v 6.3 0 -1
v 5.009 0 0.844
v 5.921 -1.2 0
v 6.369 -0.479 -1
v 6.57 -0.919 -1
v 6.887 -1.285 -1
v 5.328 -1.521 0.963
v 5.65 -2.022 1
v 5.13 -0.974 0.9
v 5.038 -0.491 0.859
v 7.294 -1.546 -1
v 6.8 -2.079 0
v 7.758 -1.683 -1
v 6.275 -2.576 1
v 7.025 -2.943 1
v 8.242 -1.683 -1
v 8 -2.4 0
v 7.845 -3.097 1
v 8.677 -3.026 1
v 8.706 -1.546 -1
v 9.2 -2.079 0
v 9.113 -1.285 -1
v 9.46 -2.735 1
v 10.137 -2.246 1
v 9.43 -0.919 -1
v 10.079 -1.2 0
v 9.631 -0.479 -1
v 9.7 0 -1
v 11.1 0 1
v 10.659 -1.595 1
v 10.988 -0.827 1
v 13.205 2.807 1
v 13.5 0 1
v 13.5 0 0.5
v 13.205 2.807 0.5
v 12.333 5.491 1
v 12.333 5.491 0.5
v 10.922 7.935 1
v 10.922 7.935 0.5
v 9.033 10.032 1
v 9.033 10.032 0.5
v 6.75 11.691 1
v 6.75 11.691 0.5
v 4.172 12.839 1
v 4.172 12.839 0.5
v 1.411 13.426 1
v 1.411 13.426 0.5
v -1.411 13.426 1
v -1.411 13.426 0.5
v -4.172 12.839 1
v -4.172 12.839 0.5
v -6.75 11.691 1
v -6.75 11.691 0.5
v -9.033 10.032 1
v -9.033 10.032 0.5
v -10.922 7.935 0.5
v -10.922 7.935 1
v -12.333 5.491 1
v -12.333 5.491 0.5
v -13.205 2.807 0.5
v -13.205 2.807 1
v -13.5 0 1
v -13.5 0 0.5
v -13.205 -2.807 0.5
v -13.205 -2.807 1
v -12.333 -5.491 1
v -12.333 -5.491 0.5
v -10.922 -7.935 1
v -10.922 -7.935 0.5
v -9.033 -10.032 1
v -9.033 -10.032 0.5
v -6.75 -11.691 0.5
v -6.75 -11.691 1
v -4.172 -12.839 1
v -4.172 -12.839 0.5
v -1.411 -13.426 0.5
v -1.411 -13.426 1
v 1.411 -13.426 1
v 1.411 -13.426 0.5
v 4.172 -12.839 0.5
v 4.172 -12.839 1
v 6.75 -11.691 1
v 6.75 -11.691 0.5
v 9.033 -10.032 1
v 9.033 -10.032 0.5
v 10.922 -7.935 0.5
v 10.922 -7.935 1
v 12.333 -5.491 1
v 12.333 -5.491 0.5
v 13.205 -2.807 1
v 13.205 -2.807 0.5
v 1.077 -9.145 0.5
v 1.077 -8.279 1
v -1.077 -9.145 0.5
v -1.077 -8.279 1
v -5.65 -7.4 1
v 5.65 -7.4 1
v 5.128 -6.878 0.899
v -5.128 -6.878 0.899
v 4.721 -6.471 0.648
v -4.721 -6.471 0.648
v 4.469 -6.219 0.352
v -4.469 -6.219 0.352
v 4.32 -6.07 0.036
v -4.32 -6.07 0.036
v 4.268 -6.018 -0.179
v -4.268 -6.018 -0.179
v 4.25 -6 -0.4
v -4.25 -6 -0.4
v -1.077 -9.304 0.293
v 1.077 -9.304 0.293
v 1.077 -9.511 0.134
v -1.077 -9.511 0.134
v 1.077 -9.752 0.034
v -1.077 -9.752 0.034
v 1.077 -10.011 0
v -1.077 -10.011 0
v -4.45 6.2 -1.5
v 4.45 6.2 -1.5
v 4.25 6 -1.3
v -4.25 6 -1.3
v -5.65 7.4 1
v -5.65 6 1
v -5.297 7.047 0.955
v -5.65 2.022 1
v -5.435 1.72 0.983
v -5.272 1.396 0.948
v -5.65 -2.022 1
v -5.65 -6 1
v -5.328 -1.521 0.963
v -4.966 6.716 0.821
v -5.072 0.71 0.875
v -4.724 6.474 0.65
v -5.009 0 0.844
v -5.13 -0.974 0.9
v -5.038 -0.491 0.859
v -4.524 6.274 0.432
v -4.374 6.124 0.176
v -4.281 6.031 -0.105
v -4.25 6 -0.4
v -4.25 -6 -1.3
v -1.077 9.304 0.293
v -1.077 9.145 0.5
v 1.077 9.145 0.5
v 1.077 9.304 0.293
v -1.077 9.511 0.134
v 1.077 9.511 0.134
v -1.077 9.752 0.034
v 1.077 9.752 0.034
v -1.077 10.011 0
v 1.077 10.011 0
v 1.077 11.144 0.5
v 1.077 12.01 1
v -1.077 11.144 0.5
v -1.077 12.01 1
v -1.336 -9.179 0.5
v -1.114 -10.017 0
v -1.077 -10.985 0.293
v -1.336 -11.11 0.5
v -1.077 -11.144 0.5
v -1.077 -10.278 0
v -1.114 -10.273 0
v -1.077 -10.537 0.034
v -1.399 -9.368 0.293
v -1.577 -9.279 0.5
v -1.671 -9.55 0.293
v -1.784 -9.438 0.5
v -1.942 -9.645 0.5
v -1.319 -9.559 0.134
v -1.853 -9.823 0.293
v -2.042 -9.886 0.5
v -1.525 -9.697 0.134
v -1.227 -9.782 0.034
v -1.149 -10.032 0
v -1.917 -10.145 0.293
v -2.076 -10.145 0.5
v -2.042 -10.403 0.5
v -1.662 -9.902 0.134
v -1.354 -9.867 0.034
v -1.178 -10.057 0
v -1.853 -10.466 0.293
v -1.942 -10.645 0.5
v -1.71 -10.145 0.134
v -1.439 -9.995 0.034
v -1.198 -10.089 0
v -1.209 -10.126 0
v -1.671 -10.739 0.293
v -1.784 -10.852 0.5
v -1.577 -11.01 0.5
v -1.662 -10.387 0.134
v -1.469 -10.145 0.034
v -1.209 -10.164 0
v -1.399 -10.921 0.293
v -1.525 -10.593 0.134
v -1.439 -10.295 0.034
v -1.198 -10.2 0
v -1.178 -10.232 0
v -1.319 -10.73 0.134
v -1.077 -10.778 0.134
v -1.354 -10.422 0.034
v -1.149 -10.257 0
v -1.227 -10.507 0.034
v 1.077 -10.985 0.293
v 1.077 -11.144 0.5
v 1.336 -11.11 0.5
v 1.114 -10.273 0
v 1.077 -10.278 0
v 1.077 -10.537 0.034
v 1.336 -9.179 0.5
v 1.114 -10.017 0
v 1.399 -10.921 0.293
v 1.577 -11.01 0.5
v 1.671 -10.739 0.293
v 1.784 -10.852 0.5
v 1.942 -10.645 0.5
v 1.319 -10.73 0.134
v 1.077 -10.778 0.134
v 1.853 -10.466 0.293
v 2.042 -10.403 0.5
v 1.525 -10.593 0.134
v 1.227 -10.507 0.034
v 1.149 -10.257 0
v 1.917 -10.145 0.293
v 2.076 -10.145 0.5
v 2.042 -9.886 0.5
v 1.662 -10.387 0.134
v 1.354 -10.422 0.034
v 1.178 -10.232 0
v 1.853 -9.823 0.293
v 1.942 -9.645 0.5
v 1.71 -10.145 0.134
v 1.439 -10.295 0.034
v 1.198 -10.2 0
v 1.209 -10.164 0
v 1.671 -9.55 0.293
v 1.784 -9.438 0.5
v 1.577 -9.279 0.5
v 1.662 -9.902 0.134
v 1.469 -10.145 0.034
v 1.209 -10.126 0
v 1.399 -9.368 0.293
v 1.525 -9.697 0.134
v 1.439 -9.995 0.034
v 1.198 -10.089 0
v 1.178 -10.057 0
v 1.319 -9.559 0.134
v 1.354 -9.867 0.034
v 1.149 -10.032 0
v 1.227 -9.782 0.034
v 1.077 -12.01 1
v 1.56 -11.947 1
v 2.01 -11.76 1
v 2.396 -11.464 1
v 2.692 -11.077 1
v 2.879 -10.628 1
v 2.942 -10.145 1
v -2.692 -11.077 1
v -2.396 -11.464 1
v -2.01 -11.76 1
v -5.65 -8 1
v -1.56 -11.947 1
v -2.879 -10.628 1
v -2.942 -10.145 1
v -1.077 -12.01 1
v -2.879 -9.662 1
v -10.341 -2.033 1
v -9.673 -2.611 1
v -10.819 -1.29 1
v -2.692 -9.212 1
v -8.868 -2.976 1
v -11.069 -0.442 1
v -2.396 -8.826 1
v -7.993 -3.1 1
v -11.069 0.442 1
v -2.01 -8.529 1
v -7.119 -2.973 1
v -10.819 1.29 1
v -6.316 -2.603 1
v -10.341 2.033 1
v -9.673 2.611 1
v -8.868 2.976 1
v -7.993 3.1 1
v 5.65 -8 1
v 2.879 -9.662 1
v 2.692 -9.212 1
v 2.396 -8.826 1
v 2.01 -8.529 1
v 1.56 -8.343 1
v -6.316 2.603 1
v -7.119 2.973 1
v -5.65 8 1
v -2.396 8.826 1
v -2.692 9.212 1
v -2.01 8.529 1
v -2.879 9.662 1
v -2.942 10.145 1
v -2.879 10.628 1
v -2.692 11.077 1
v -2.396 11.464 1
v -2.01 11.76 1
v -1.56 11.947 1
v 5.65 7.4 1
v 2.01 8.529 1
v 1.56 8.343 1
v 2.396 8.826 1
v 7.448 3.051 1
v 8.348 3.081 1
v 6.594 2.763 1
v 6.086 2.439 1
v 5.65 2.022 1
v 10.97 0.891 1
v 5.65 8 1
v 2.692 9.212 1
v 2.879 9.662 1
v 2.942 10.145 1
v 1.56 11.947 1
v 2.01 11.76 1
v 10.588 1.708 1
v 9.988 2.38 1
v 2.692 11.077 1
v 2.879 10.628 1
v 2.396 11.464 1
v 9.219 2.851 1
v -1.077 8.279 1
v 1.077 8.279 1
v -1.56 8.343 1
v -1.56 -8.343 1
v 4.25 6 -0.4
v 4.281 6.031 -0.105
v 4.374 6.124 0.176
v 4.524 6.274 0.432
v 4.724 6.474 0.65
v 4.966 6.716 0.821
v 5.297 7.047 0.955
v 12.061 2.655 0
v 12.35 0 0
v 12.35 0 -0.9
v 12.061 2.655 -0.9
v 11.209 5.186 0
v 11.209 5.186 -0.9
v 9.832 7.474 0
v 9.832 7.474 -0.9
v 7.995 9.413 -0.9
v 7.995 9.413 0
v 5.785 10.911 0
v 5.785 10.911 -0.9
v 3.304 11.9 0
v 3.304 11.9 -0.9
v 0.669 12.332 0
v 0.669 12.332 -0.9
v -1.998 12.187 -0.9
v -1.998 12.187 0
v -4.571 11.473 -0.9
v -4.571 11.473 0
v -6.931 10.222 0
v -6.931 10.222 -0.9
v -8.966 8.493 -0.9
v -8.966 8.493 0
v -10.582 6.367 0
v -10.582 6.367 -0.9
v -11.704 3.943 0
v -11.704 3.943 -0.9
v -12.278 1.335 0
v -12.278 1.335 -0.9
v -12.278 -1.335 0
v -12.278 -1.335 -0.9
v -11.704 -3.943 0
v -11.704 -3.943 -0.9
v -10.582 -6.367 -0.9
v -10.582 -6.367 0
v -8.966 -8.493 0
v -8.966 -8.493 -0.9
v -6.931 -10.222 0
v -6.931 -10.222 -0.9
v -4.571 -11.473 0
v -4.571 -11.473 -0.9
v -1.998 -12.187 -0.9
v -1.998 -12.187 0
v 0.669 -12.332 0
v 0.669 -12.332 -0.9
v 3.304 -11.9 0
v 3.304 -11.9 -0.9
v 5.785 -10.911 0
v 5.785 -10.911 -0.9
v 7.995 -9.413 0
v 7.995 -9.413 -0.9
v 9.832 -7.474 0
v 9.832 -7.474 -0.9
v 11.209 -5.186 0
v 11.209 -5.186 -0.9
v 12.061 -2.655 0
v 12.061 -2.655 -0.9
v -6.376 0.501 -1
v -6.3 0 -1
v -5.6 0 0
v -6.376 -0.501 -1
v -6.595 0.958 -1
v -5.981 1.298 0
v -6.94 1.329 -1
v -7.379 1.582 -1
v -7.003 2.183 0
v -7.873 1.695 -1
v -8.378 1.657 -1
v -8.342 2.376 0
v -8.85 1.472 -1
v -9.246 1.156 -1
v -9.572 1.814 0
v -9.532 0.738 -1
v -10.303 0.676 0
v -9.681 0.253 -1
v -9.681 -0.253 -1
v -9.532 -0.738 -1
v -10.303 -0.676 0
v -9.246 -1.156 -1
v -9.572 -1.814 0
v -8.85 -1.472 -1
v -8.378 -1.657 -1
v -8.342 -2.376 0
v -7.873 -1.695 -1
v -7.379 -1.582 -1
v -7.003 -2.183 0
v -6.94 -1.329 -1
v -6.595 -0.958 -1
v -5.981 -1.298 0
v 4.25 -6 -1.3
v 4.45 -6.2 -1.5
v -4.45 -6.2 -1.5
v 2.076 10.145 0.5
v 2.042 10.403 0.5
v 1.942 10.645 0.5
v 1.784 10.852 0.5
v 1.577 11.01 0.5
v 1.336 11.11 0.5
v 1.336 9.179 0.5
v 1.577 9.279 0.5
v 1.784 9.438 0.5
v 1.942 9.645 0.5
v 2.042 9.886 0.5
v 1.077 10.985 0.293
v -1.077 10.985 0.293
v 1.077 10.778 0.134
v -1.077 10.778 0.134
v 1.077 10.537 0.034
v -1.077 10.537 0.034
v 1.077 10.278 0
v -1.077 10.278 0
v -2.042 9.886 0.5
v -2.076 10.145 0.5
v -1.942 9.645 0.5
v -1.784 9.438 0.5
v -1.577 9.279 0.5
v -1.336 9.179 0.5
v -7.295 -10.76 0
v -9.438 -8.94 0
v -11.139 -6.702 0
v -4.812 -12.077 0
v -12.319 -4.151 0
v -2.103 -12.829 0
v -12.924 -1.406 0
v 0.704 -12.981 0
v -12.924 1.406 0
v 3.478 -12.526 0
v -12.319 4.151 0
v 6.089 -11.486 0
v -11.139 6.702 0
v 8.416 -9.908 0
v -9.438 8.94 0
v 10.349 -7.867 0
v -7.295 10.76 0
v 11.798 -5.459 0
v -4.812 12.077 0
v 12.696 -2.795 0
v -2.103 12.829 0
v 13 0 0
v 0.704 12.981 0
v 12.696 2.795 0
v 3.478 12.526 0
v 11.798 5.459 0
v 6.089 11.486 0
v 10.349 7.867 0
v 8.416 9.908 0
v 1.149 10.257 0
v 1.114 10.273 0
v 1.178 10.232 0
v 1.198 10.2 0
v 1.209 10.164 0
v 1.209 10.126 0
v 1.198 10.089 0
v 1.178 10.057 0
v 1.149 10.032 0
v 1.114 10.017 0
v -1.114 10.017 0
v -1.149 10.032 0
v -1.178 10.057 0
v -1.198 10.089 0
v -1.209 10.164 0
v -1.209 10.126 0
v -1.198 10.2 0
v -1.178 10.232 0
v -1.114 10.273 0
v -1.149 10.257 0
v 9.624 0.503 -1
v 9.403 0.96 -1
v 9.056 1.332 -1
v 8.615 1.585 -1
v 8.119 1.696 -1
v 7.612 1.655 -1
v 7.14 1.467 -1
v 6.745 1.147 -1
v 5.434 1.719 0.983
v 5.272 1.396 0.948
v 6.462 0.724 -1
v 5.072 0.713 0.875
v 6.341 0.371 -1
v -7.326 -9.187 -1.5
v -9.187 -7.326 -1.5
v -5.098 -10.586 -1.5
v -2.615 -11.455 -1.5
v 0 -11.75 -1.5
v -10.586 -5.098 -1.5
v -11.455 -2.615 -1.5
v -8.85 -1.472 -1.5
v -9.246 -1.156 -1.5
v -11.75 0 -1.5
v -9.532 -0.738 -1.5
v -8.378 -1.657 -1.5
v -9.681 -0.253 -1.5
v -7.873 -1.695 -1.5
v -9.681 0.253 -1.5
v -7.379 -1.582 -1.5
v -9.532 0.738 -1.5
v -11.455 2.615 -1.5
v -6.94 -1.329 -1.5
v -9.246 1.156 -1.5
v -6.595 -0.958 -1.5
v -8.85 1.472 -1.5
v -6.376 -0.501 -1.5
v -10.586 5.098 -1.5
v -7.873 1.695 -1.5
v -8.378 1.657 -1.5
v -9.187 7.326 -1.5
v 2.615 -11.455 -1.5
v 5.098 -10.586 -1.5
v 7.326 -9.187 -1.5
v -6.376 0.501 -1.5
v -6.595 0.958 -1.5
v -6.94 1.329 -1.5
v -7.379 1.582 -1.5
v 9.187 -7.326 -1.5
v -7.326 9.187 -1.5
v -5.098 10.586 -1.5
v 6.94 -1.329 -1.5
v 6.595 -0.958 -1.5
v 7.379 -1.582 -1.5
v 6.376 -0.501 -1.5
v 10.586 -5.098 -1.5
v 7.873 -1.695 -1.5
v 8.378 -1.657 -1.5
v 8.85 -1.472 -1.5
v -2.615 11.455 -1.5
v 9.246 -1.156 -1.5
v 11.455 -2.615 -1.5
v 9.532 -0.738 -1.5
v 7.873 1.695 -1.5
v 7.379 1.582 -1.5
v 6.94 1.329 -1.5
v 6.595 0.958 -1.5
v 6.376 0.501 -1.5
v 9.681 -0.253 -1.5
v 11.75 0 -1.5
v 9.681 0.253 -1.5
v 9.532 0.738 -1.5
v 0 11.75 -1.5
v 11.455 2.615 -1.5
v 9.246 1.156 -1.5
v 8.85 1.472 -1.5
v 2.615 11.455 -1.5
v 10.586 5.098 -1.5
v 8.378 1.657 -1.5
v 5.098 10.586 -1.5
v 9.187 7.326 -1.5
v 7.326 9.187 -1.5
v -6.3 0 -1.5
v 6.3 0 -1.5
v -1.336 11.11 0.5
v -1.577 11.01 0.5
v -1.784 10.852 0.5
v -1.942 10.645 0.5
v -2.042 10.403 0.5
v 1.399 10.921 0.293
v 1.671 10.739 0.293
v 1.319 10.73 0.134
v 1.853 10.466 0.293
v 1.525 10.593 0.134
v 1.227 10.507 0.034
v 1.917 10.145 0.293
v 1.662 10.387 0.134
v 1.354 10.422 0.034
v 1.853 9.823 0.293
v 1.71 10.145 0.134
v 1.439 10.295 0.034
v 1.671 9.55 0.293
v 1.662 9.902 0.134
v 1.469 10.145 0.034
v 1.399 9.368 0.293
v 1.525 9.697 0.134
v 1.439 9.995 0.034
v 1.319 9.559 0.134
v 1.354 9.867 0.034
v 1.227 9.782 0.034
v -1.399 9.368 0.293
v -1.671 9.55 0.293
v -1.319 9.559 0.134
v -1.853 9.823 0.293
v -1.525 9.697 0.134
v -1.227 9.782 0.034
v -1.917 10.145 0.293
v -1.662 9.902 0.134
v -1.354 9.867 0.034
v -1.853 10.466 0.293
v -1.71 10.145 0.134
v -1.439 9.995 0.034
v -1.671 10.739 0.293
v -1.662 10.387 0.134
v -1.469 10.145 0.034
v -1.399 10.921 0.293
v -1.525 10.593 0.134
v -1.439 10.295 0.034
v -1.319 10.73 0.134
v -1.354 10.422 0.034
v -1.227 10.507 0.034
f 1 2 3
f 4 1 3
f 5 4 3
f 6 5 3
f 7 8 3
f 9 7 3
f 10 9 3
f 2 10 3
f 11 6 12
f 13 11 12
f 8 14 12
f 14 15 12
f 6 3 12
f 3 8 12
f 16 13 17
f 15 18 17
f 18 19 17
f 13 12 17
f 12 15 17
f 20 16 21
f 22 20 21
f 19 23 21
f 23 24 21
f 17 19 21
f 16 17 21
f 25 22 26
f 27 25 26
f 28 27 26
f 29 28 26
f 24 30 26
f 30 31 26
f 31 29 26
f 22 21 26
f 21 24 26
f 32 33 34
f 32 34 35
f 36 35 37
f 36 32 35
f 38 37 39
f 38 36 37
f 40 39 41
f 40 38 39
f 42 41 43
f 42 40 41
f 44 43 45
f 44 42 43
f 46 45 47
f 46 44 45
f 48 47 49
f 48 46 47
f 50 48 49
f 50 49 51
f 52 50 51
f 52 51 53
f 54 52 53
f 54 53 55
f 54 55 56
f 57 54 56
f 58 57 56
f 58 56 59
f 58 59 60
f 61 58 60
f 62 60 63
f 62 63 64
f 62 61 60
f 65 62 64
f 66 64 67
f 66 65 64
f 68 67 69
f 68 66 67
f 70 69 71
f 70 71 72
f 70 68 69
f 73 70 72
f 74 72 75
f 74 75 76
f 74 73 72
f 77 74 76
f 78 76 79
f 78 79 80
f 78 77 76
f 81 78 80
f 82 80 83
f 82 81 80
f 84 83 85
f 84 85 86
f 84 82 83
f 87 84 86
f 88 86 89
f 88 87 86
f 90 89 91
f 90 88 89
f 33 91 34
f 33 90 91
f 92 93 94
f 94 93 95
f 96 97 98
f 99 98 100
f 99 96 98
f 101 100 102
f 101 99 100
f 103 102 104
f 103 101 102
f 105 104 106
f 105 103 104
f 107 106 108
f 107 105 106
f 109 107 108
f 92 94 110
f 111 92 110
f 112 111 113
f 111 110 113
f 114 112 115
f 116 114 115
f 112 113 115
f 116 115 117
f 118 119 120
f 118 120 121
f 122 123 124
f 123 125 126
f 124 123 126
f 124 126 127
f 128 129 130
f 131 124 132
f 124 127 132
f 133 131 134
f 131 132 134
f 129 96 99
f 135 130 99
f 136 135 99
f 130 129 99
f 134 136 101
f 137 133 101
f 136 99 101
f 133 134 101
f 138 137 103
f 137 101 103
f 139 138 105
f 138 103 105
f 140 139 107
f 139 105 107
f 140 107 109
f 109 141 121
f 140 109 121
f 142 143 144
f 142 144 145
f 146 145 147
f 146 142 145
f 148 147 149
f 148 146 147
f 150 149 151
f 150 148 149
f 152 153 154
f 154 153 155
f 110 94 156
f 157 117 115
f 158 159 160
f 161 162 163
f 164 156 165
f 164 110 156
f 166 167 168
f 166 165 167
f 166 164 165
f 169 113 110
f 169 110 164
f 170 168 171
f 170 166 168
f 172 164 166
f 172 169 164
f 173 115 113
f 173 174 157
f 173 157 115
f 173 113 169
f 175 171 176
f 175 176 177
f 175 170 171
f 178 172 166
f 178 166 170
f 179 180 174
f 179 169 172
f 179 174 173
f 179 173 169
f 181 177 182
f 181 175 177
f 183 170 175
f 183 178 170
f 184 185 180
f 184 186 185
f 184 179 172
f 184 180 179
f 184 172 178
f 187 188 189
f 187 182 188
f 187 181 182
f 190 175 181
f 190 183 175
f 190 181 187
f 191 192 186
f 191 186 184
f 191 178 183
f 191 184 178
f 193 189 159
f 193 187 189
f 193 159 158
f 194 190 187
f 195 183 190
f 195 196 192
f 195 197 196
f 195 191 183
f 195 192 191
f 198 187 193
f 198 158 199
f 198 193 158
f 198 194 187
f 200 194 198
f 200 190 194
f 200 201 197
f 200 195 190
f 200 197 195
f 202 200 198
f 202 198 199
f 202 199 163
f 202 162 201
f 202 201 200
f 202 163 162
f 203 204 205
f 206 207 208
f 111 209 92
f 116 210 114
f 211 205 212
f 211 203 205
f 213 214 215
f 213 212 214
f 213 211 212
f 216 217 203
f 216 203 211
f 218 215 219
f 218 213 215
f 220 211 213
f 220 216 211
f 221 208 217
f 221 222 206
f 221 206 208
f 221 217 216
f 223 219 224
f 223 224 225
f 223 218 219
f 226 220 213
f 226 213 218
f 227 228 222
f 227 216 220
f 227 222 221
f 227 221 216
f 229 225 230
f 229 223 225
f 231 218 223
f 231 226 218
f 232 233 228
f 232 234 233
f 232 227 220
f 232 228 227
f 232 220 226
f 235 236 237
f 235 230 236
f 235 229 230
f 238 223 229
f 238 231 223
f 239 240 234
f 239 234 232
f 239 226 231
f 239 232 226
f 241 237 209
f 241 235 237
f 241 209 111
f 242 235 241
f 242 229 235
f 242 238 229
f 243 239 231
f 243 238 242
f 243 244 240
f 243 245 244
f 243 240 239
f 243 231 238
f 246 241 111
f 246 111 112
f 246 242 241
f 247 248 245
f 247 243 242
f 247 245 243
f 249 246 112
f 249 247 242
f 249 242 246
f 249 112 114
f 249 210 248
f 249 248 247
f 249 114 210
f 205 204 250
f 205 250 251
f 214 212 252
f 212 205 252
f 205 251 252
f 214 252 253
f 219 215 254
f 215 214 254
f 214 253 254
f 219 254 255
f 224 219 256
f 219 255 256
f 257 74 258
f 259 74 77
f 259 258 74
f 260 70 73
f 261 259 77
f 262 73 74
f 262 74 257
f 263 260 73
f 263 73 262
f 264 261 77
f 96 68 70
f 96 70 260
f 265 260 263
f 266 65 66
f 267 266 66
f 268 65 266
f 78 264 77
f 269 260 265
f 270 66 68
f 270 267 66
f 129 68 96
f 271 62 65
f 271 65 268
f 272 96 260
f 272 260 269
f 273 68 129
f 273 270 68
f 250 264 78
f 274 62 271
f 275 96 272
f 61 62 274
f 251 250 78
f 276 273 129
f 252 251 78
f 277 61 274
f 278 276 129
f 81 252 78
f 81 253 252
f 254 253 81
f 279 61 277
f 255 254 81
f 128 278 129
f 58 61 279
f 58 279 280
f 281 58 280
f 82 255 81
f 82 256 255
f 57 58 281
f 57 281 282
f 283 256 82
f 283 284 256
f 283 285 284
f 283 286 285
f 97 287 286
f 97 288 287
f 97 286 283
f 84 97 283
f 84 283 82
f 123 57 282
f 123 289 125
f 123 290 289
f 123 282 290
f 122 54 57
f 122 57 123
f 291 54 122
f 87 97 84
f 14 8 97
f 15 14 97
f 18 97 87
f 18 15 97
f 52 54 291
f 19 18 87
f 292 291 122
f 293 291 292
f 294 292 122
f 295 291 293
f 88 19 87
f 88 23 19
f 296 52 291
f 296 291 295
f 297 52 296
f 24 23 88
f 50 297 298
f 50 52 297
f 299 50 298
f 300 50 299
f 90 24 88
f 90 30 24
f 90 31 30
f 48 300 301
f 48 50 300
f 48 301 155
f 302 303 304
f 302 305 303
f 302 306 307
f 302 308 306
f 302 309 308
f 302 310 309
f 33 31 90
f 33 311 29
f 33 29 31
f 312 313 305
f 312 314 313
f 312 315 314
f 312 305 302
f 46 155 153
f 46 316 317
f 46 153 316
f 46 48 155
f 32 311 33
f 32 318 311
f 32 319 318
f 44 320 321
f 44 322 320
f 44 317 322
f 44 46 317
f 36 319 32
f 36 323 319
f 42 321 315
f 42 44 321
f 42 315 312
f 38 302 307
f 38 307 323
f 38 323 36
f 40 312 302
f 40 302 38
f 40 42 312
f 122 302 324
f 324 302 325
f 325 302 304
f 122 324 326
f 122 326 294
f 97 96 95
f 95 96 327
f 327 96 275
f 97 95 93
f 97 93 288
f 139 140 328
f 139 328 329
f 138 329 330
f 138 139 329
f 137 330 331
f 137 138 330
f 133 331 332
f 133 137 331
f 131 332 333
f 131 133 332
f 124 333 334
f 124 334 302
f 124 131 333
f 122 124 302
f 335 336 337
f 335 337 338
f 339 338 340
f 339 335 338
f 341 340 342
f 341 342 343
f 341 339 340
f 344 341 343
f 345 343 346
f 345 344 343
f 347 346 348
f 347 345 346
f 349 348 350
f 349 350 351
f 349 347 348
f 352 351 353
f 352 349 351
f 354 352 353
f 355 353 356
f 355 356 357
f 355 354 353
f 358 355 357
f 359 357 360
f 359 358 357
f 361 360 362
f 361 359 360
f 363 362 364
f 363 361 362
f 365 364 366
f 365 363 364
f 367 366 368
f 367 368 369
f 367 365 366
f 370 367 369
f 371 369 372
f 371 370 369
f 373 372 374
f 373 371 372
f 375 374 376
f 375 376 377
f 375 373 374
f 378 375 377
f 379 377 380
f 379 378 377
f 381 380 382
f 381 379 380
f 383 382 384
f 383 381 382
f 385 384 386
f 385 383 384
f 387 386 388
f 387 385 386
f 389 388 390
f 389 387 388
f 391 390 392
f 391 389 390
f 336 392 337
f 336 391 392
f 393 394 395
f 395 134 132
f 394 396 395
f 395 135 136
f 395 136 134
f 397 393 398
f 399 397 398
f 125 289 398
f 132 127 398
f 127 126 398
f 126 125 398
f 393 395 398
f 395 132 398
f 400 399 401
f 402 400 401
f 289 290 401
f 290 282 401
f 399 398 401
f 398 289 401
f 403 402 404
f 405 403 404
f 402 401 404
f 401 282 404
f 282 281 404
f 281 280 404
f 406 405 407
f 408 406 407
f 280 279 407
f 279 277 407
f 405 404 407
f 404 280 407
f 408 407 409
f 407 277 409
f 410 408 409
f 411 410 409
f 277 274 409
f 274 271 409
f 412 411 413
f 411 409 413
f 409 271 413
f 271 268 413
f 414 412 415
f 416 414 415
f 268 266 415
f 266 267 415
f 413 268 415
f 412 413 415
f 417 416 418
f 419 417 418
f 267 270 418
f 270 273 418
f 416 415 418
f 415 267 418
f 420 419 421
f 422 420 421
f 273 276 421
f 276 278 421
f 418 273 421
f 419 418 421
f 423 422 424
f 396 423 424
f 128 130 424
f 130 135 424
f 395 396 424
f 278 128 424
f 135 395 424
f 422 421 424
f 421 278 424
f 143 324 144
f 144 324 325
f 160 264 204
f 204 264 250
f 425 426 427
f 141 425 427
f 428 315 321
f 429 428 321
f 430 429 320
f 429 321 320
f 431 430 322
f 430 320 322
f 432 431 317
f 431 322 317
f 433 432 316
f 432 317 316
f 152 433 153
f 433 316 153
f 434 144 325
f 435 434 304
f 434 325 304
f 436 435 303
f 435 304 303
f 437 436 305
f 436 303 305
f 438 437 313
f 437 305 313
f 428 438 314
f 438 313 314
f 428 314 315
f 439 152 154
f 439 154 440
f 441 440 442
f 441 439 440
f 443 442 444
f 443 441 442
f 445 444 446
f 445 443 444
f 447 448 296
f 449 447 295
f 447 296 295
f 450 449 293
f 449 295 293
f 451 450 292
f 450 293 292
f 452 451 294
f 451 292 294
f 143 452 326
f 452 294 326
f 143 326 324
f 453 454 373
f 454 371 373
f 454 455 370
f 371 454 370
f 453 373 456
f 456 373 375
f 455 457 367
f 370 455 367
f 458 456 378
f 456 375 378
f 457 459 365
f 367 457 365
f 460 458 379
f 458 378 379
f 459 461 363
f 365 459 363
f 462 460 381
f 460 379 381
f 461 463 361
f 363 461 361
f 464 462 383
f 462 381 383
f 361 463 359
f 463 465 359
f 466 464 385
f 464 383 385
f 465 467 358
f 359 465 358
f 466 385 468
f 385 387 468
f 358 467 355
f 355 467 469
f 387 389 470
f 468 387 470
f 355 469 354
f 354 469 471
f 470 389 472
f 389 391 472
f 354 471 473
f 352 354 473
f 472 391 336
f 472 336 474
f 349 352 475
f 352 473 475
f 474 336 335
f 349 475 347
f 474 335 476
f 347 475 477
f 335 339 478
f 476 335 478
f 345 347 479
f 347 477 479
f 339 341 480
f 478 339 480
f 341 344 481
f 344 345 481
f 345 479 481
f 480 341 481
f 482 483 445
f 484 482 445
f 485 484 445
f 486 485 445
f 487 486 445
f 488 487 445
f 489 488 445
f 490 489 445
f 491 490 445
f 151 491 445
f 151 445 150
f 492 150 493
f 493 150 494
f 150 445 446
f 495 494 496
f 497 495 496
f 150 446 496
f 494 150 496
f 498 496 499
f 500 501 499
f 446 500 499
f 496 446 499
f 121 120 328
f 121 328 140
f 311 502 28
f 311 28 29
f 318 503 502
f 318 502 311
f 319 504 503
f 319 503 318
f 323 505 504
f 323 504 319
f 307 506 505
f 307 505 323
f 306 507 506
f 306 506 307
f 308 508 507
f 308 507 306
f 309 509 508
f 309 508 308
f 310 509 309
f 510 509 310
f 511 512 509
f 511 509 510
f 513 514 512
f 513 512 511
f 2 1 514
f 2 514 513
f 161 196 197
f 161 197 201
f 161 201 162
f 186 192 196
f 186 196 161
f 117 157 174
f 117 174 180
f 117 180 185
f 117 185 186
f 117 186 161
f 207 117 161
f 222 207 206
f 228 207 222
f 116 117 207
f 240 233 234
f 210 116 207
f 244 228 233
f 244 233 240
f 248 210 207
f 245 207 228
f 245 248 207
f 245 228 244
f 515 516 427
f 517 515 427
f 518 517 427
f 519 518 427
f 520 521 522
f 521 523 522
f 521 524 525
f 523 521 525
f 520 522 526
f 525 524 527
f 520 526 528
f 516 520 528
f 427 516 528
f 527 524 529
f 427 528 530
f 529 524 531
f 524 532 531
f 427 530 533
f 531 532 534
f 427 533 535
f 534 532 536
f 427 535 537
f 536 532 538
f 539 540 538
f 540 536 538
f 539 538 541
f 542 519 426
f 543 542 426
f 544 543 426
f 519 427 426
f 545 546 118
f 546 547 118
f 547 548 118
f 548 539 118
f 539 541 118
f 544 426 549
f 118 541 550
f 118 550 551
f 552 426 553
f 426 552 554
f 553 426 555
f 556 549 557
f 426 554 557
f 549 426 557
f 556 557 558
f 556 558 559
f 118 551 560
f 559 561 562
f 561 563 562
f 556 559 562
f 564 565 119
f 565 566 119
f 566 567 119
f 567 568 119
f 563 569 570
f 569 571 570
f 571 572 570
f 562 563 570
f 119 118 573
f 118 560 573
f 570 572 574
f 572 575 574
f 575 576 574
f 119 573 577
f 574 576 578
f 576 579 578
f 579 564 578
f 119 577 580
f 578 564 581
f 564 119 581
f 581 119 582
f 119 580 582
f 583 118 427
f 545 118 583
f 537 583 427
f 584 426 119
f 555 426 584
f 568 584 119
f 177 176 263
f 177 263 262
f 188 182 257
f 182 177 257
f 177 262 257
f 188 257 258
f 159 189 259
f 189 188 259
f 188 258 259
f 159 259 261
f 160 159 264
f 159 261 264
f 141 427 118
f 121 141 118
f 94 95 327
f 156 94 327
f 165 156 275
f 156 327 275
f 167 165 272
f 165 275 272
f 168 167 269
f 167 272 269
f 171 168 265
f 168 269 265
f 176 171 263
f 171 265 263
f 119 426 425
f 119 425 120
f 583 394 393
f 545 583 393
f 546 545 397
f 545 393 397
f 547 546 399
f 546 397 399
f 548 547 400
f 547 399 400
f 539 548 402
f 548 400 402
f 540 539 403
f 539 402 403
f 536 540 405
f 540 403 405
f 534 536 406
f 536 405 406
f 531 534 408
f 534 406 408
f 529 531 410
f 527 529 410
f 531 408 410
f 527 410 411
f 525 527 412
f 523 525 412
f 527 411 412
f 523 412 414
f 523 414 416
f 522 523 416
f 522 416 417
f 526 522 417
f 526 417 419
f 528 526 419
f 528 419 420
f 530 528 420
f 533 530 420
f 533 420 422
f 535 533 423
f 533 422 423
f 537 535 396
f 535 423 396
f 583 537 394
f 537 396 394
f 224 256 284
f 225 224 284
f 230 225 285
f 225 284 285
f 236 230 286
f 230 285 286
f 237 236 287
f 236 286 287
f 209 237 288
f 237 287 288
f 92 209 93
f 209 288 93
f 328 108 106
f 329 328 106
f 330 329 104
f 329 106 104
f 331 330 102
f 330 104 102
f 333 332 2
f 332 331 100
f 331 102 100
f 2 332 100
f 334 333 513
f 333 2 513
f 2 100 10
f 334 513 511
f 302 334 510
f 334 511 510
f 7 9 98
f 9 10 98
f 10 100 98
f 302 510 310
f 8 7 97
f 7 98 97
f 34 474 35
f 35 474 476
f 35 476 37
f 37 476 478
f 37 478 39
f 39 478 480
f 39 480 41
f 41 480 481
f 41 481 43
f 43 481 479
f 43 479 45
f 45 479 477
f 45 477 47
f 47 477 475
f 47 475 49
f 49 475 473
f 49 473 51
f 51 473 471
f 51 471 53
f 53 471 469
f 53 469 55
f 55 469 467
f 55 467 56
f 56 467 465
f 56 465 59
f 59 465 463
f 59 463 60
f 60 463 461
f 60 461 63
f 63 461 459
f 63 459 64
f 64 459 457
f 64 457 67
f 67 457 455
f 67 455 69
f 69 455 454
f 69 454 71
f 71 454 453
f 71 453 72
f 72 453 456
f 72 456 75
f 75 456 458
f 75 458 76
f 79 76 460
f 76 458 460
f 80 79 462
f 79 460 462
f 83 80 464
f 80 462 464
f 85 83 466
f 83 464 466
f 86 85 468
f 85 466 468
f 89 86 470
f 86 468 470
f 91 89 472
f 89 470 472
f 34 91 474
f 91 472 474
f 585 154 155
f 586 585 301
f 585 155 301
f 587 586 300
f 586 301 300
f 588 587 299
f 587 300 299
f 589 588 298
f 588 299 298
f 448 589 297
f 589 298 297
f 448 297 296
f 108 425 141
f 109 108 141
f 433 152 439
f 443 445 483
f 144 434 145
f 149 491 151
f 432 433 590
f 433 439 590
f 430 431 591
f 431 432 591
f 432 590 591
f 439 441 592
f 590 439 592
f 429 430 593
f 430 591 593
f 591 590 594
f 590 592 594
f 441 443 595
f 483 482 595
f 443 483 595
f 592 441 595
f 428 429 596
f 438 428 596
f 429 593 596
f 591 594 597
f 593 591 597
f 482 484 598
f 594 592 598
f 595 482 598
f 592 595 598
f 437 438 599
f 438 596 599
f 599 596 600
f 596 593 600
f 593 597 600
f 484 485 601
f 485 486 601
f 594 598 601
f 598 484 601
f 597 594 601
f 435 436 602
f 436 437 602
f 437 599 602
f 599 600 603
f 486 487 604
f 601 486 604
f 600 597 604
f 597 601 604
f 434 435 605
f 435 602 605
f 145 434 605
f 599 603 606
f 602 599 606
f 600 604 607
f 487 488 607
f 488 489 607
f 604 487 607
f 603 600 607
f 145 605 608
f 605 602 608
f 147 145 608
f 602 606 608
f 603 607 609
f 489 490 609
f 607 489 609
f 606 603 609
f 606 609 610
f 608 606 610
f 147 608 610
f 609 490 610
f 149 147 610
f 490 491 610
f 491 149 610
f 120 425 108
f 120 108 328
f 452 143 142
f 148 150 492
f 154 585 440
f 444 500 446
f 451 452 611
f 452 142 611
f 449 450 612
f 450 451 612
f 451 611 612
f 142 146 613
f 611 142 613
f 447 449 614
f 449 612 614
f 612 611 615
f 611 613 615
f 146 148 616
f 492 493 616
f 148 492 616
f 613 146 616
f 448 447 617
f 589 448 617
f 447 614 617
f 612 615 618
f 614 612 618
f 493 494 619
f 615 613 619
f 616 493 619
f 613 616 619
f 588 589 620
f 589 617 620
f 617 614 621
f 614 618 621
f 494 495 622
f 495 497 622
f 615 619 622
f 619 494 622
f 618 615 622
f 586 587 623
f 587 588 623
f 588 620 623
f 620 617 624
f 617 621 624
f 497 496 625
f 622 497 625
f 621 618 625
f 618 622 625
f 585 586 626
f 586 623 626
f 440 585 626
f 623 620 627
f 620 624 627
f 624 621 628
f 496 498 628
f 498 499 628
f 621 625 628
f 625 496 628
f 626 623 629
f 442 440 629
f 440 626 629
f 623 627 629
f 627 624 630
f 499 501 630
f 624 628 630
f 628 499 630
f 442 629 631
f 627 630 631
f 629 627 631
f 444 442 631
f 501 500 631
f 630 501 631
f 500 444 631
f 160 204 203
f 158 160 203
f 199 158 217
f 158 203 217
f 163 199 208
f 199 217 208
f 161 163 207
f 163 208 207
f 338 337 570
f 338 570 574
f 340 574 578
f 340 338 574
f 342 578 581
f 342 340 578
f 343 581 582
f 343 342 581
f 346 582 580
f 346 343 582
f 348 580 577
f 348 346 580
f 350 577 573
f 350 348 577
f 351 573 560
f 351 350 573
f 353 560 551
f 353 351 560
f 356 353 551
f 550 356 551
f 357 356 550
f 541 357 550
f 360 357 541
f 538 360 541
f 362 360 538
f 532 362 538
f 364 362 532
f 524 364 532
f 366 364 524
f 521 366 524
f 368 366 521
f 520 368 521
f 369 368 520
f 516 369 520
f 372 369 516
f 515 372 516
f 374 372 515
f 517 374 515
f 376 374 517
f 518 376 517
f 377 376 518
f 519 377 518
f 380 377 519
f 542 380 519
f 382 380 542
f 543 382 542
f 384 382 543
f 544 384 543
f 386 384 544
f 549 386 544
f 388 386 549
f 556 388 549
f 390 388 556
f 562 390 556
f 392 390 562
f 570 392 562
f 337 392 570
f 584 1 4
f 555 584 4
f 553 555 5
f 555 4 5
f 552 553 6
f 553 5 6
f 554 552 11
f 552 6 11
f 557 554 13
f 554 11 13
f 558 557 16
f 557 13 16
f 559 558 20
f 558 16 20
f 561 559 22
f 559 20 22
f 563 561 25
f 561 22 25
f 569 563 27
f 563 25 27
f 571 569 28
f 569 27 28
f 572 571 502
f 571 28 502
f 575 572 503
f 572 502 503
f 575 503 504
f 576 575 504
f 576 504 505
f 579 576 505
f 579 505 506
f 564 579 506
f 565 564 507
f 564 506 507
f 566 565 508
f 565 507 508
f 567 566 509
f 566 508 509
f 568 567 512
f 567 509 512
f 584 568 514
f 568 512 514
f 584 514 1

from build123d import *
from OCP.BRepFilletAPI import BRepFilletAPI_MakeChamfer

# Parameters (mm, degrees)
SKETCH1_R           = 12.35
SKETCH1_R_2         = 1.7
BOSS_EXTRUDE1_DEPTH = 1.5
BOSS_EXTRUDE3_START = 1
SKETCH3_R           = 13.5
SKETCH3_R_2         = 1.7
BOSS_EXTRUDE3_DEPTH = 1
CHAMFER2_SIZE       = 0.5
CHAMFER3_SIZE       = 2
CHAMFER3_SIZE2      = 1.400415076
SKETCH2_W           = 8.5
SKETCH2_H           = 12
CUT_EXTRUDE2_DEPTH  = 20.254869514
CHAMFER4_SIZE       = 0.2
CHAMFER5_SIZE       = 0.6
FILLET1_START       = -6
FILLET1_DEPTH       = 12
FILLET1_START_2     = -5.6500001
FILLET1_2_DEPTH     = 11.3000001
FILLET1_START_3     = -8
FILLET1_3_DEPTH     = 2
FILLET1_START_4     = 6
FILLET1_4_DEPTH     = 2
CUT_EXTRUDE3_DEPTH  = 1
FILLET2_R           = 1


with BuildPart() as part:
    # Sketch1 → Boss-Extrude1 (new body)
    with BuildSketch(Plane.XY):
        Circle(SKETCH1_R)
        with Locations((-8, 0)):
            Circle(SKETCH1_R_2, mode=Mode.SUBTRACT)
        with Locations(Location((8, 0, 0), (0, 0, 180))):
            Circle(SKETCH1_R_2, mode=Mode.SUBTRACT)
    extrude(amount=-BOSS_EXTRUDE1_DEPTH)

    # Sketch3 → Boss-Extrude3 (add)
    with BuildSketch(Plane.XY.offset(BOSS_EXTRUDE3_START)):
        Circle(SKETCH3_R)
        with Locations((-8, 0)):
            Circle(SKETCH3_R_2, mode=Mode.SUBTRACT)
        with Locations((8, 0)):
            Circle(SKETCH3_R_2, mode=Mode.SUBTRACT)
    extrude(amount=-BOSS_EXTRUDE3_DEPTH)

    # Chamfer2
    chamfer2_edges = [part.edges().sort_by_distance(p)[0] for p in [
        (-13.5, 0, 0),
    ]]
    chamfer(chamfer2_edges, length=CHAMFER2_SIZE)

    # Chamfer3: one chamfer whose edges measure the first distance from different faces: ONE call of the kernel's chamfer builder (chamfer() names one face for all edges)
    chamfer3_edges_1 = [part.edges().sort_by_distance(p)[0] for p in [
        (-9.7, 0, 1),
    ]]
    chamfer3_side_1 = [part.faces().sort_by_distance(p)[0] for p in [
        (-9.7, 0, -0.25),
    ]]
    chamfer3_edges_2 = [part.edges().sort_by_distance(p)[0] for p in [
        (6.3, 0, 1),
    ]]
    chamfer3_side_2 = [part.faces().sort_by_distance(p)[0] for p in [
        (8, -1.7, -0.25),
    ]]
    chamfer3 = BRepFilletAPI_MakeChamfer(part.part.solid().wrapped)
    for e in chamfer3_edges_1:
        chamfer3.Add(CHAMFER3_SIZE, CHAMFER3_SIZE2, e.wrapped, chamfer3_side_1[0].wrapped)  # the first distance lies on this face
    for e in chamfer3_edges_2:
        chamfer3.Add(CHAMFER3_SIZE, CHAMFER3_SIZE2, e.wrapped, chamfer3_side_2[0].wrapped)  # the first distance lies on this face
    add(Compound.cast(chamfer3.Shape()), mode=Mode.REPLACE)

    # Sketch2 → Cut-Extrude2 (cut, through all)
    with BuildSketch(Plane(origin=(0, 0, -1.5), x_dir=(-1, 0, 0), z_dir=(0, 0, -1))):
        Rectangle(SKETCH2_W, SKETCH2_H)
    extrude(amount=-CUT_EXTRUDE2_DEPTH, mode=Mode.SUBTRACT)

    # Chamfer4
    chamfer4_edges = [part.edges().sort_by_distance(p)[0] for p in [
        (-4.25, 0, -1.5),
        (0, 6, -1.5),
        (4.25, 0, -1.5),
        (0, -6, -1.5),
    ]]
    chamfer(chamfer4_edges, length=CHAMFER4_SIZE)

    # Chamfer5
    chamfer5_edges = [part.edges().sort_by_distance(p)[0] for p in [
        (-12.35, 0, -1.5),
    ]]
    chamfer(chamfer5_edges, length=CHAMFER5_SIZE)

    # Fillet1: read off the stored shape, not the designer's step
    # Fillet1 outline → Fillet1 (cut)
    with BuildSketch(Plane(origin=(0, 0, 0), x_dir=(1, 0, 0), z_dir=(0, 1, 0)).offset(FILLET1_START)):
        with BuildLine():
            Line((-5.65, -1), (-4.25, -1))
            Line((-4.25, -1), (-4.25, 0.4))
            ThreePointArc((-4.25, 0.4), (-4.660050506, -0.589949494), (-5.65, -1))
        make_face()
        with BuildLine():
            ThreePointArc((5.65, -1), (4.660050506, -0.589949494), (4.25, 0.4))
            Line((4.25, 0.4), (4.25, -1))
            Line((4.25, -1), (5.65, -1))
        make_face()
    extrude(amount=FILLET1_DEPTH, mode=Mode.SUBTRACT)

    # Fillet1 2 outline → Fillet1 2 (cut)
    with BuildSketch(Plane.YZ.offset(FILLET1_START_2)):
        with BuildLine():
            Line((7.4, 1), (6, 1))
            Line((6, 1), (6, -0.4))
            ThreePointArc((6, -0.4), (6.410050506, 0.589949494), (7.4, 1))
        make_face()
        with BuildLine():
            ThreePointArc((-7.4, 1), (-6.410050506, 0.589949494), (-6, -0.4))
            Line((-6, -0.4), (-6, 1))
            Line((-6, 1), (-7.4, 1))
        make_face()
    extrude(amount=FILLET1_2_DEPTH, mode=Mode.SUBTRACT)

    # Fillet1 3 outline → Fillet1 3 (add)
    with BuildSketch(Plane(origin=(0, 0, 0), x_dir=(1, 0, 0), z_dir=(0, 1, 0)).offset(FILLET1_START_3)):
        with BuildLine():
            ThreePointArc((4.25, 0.4), (4.660050506, -0.589949494), (5.65, -1))
            Line((5.65, -1), (5.65, 0.4))
            Line((5.65, 0.4), (4.25, 0.4))
        make_face()
        with BuildLine():
            Line((-5.6500001, 0.4), (-5.65, -1))
            ThreePointArc((-5.65, -1), (-4.660050506, -0.589949494), (-4.25, 0.4))
            Line((-4.25, 0.4), (-5.6500001, 0.4))
        make_face()
    extrude(amount=FILLET1_3_DEPTH)

    # Fillet1 4 outline → Fillet1 4 (add)
    with BuildSketch(Plane(origin=(0, 0, 0), x_dir=(1, 0, 0), z_dir=(0, 1, 0)).offset(FILLET1_START_4)):
        with BuildLine():
            ThreePointArc((4.25, 0.4), (4.660050506, -0.589949494), (5.65, -1))
            Line((5.65, -1), (5.65, 0.4))
            Line((5.65, 0.4), (4.25, 0.4))
        make_face()
        with BuildLine():
            Line((-5.6500001, 0.4), (-5.65, -1))
            ThreePointArc((-5.65, -1), (-4.660050506, -0.589949494), (-4.25, 0.4))
            Line((-4.25, 0.4), (-5.6500001, 0.4))
        make_face()
    extrude(amount=FILLET1_4_DEPTH)

    # Sketch4 → Cut-Extrude3 (cut)
    with BuildSketch(Plane.XY.offset(1)):
        with BuildLine():
            Line((-1.07681329, 11.278202352), (1.07681329, 11.278202352))
            ThreePointArc((1.07681329, 11.278202352), (2.210300963, 10.144714678), (1.07681329, 9.011227005))
            Line((1.07681329, 9.011227005), (-1.07681329, 9.011227005))
            ThreePointArc((-1.07681329, 9.011227005), (-2.210300963, 10.144714678), (-1.07681329, 11.278202352))
        make_face()
        with BuildLine():
            Line((-1.07681329, -11.278202352), (1.07681329, -11.278202352))
            ThreePointArc((1.07681329, -11.278202352), (2.210300963, -10.144714678), (1.07681329, -9.011227005))
            Line((1.07681329, -9.011227005), (-1.07681329, -9.011227005))
            ThreePointArc((-1.07681329, -9.011227005), (-2.210300963, -10.144714678), (-1.07681329, -11.278202352))
        make_face()
    extrude(amount=-CUT_EXTRUDE3_DEPTH, mode=Mode.SUBTRACT)

    # Fillet2
    fillet2_edges = [part.edges().sort_by_distance(p)[0] for p in [
        (2.210300963, -10.144714678, 0),
        (0, -11.278202352, 0),
        (-2.210300963, -10.144714678, 0),
        (0, -9.011227005, 0),
        (2.210300963, 10.144714678, 0),
        (0, 9.011227005, 0),
        (-2.210300963, 10.144714678, 0),
        (0, 11.278202352, 0),
    ]]
    fillet(fillet2_edges, radius=FILLET2_R - 0.0001)  # a hair under: the kernel refuses the full size

    # Chamfer6: read off the stored shape, not the designer's step
    # Chamfer6: loft between two sections, ruled curve by curve
    chamfer6_from = [
        Edge.make_three_point_arc((-1.07681329, 11.144227755, 0.5), (-1.783575765, 10.851477153, 0.5), (-2.076326367, 10.144714678, 0.5)),
        Edge.make_three_point_arc((-2.076326367, 10.144714678, 0.5), (-1.783575765, 9.437952203, 0.5), (-1.07681329, 9.145201601, 0.5)),
        Edge.make_three_point_arc((1.07681329, 9.145201601, 0.5), (1.783575765, 9.437952203, 0.5), (2.076326367, 10.144714678, 0.5)),
        Edge.make_three_point_arc((2.076326367, 10.144714678, 0.5), (1.783575765, 10.851477153, 0.5), (1.07681329, 11.144227755, 0.5)),
        Edge.make_line((1.07681329, 11.144227755, 0.5), (-1.07681329, 11.144227755, 0.5)),
        Edge.make_line((-1.07681329, 9.145201601, 0.5), (1.07681329, 9.145201601, 0.5)),
    ]
    chamfer6_to = [
        Edge.make_three_point_arc((-1.07681329, 12.010253159, 1), (-2.3959482, 11.463849589, 1), (-2.942351771, 10.144714678, 1)),
        Edge.make_three_point_arc((-2.942351771, 10.144714678, 1), (-2.3959482, 8.825579768, 1), (-1.07681329, 8.279176197, 1)),
        Edge.make_three_point_arc((1.07681329, 8.279176197, 1), (2.3959482, 8.825579768, 1), (2.942351771, 10.144714678, 1)),
        Edge.make_three_point_arc((2.942351771, 10.144714678, 1), (2.3959482, 11.463849589, 1), (1.07681329, 12.010253159, 1)),
        Edge.make_line((1.07681329, 12.010253159, 1), (-1.07681329, 12.010253159, 1)),
        Edge.make_line((-1.07681329, 8.279176197, 1), (1.07681329, 8.279176197, 1)),
    ]
    chamfer6 = Solid(Shell([*[Face.make_surface_from_curves(chamfer6_from[k], chamfer6_to[k]) for k in range(6)], Face(Wire(chamfer6_from)), Face(Wire(chamfer6_to))]))
    add(chamfer6, mode=Mode.SUBTRACT)

    # Chamfer6 2: loft between two sections, ruled curve by curve
    chamfer6_2_from = [
        Edge.make_three_point_arc((-1.07681329, -9.145201601, 0.5), (-1.783575765, -9.437952203, 0.5), (-2.076326367, -10.144714678, 0.5)),
        Edge.make_three_point_arc((-2.076326367, -10.144714678, 0.5), (-1.783575765, -10.851477153, 0.5), (-1.07681329, -11.144227755, 0.5)),
        Edge.make_three_point_arc((1.07681329, -11.144227755, 0.5), (1.783575765, -10.851477153, 0.5), (2.076326367, -10.144714678, 0.5)),
        Edge.make_three_point_arc((2.076326367, -10.144714678, 0.5), (1.783575765, -9.437952203, 0.5), (1.07681329, -9.145201601, 0.5)),
        Edge.make_line((1.07681329, -9.145201601, 0.5), (-1.07681329, -9.145201601, 0.5)),
        Edge.make_line((-1.07681329, -11.144227755, 0.5), (1.07681329, -11.144227755, 0.5)),
    ]
    chamfer6_2_to = [
        Edge.make_three_point_arc((-1.07681329, -8.279176197, 1), (-2.3959482, -8.825579768, 1), (-2.942351771, -10.144714678, 1)),
        Edge.make_three_point_arc((-2.942351771, -10.144714678, 1), (-2.3959482, -11.463849589, 1), (-1.07681329, -12.010253159, 1)),
        Edge.make_three_point_arc((1.07681329, -12.010253159, 1), (2.3959482, -11.463849589, 1), (2.942351771, -10.144714678, 1)),
        Edge.make_three_point_arc((2.942351771, -10.144714678, 1), (2.3959482, -8.825579768, 1), (1.07681329, -8.279176197, 1)),
        Edge.make_line((1.07681329, -8.279176197, 1), (-1.07681329, -8.279176197, 1)),
        Edge.make_line((-1.07681329, -12.010253159, 1), (1.07681329, -12.010253159, 1)),
    ]
    chamfer6_2 = Solid(Shell([*[Face.make_surface_from_curves(chamfer6_2_from[k], chamfer6_2_to[k]) for k in range(6)], Face(Wire(chamfer6_2_from)), Face(Wire(chamfer6_2_to))]))
    add(chamfer6_2, mode=Mode.SUBTRACT)


solid = part.part
